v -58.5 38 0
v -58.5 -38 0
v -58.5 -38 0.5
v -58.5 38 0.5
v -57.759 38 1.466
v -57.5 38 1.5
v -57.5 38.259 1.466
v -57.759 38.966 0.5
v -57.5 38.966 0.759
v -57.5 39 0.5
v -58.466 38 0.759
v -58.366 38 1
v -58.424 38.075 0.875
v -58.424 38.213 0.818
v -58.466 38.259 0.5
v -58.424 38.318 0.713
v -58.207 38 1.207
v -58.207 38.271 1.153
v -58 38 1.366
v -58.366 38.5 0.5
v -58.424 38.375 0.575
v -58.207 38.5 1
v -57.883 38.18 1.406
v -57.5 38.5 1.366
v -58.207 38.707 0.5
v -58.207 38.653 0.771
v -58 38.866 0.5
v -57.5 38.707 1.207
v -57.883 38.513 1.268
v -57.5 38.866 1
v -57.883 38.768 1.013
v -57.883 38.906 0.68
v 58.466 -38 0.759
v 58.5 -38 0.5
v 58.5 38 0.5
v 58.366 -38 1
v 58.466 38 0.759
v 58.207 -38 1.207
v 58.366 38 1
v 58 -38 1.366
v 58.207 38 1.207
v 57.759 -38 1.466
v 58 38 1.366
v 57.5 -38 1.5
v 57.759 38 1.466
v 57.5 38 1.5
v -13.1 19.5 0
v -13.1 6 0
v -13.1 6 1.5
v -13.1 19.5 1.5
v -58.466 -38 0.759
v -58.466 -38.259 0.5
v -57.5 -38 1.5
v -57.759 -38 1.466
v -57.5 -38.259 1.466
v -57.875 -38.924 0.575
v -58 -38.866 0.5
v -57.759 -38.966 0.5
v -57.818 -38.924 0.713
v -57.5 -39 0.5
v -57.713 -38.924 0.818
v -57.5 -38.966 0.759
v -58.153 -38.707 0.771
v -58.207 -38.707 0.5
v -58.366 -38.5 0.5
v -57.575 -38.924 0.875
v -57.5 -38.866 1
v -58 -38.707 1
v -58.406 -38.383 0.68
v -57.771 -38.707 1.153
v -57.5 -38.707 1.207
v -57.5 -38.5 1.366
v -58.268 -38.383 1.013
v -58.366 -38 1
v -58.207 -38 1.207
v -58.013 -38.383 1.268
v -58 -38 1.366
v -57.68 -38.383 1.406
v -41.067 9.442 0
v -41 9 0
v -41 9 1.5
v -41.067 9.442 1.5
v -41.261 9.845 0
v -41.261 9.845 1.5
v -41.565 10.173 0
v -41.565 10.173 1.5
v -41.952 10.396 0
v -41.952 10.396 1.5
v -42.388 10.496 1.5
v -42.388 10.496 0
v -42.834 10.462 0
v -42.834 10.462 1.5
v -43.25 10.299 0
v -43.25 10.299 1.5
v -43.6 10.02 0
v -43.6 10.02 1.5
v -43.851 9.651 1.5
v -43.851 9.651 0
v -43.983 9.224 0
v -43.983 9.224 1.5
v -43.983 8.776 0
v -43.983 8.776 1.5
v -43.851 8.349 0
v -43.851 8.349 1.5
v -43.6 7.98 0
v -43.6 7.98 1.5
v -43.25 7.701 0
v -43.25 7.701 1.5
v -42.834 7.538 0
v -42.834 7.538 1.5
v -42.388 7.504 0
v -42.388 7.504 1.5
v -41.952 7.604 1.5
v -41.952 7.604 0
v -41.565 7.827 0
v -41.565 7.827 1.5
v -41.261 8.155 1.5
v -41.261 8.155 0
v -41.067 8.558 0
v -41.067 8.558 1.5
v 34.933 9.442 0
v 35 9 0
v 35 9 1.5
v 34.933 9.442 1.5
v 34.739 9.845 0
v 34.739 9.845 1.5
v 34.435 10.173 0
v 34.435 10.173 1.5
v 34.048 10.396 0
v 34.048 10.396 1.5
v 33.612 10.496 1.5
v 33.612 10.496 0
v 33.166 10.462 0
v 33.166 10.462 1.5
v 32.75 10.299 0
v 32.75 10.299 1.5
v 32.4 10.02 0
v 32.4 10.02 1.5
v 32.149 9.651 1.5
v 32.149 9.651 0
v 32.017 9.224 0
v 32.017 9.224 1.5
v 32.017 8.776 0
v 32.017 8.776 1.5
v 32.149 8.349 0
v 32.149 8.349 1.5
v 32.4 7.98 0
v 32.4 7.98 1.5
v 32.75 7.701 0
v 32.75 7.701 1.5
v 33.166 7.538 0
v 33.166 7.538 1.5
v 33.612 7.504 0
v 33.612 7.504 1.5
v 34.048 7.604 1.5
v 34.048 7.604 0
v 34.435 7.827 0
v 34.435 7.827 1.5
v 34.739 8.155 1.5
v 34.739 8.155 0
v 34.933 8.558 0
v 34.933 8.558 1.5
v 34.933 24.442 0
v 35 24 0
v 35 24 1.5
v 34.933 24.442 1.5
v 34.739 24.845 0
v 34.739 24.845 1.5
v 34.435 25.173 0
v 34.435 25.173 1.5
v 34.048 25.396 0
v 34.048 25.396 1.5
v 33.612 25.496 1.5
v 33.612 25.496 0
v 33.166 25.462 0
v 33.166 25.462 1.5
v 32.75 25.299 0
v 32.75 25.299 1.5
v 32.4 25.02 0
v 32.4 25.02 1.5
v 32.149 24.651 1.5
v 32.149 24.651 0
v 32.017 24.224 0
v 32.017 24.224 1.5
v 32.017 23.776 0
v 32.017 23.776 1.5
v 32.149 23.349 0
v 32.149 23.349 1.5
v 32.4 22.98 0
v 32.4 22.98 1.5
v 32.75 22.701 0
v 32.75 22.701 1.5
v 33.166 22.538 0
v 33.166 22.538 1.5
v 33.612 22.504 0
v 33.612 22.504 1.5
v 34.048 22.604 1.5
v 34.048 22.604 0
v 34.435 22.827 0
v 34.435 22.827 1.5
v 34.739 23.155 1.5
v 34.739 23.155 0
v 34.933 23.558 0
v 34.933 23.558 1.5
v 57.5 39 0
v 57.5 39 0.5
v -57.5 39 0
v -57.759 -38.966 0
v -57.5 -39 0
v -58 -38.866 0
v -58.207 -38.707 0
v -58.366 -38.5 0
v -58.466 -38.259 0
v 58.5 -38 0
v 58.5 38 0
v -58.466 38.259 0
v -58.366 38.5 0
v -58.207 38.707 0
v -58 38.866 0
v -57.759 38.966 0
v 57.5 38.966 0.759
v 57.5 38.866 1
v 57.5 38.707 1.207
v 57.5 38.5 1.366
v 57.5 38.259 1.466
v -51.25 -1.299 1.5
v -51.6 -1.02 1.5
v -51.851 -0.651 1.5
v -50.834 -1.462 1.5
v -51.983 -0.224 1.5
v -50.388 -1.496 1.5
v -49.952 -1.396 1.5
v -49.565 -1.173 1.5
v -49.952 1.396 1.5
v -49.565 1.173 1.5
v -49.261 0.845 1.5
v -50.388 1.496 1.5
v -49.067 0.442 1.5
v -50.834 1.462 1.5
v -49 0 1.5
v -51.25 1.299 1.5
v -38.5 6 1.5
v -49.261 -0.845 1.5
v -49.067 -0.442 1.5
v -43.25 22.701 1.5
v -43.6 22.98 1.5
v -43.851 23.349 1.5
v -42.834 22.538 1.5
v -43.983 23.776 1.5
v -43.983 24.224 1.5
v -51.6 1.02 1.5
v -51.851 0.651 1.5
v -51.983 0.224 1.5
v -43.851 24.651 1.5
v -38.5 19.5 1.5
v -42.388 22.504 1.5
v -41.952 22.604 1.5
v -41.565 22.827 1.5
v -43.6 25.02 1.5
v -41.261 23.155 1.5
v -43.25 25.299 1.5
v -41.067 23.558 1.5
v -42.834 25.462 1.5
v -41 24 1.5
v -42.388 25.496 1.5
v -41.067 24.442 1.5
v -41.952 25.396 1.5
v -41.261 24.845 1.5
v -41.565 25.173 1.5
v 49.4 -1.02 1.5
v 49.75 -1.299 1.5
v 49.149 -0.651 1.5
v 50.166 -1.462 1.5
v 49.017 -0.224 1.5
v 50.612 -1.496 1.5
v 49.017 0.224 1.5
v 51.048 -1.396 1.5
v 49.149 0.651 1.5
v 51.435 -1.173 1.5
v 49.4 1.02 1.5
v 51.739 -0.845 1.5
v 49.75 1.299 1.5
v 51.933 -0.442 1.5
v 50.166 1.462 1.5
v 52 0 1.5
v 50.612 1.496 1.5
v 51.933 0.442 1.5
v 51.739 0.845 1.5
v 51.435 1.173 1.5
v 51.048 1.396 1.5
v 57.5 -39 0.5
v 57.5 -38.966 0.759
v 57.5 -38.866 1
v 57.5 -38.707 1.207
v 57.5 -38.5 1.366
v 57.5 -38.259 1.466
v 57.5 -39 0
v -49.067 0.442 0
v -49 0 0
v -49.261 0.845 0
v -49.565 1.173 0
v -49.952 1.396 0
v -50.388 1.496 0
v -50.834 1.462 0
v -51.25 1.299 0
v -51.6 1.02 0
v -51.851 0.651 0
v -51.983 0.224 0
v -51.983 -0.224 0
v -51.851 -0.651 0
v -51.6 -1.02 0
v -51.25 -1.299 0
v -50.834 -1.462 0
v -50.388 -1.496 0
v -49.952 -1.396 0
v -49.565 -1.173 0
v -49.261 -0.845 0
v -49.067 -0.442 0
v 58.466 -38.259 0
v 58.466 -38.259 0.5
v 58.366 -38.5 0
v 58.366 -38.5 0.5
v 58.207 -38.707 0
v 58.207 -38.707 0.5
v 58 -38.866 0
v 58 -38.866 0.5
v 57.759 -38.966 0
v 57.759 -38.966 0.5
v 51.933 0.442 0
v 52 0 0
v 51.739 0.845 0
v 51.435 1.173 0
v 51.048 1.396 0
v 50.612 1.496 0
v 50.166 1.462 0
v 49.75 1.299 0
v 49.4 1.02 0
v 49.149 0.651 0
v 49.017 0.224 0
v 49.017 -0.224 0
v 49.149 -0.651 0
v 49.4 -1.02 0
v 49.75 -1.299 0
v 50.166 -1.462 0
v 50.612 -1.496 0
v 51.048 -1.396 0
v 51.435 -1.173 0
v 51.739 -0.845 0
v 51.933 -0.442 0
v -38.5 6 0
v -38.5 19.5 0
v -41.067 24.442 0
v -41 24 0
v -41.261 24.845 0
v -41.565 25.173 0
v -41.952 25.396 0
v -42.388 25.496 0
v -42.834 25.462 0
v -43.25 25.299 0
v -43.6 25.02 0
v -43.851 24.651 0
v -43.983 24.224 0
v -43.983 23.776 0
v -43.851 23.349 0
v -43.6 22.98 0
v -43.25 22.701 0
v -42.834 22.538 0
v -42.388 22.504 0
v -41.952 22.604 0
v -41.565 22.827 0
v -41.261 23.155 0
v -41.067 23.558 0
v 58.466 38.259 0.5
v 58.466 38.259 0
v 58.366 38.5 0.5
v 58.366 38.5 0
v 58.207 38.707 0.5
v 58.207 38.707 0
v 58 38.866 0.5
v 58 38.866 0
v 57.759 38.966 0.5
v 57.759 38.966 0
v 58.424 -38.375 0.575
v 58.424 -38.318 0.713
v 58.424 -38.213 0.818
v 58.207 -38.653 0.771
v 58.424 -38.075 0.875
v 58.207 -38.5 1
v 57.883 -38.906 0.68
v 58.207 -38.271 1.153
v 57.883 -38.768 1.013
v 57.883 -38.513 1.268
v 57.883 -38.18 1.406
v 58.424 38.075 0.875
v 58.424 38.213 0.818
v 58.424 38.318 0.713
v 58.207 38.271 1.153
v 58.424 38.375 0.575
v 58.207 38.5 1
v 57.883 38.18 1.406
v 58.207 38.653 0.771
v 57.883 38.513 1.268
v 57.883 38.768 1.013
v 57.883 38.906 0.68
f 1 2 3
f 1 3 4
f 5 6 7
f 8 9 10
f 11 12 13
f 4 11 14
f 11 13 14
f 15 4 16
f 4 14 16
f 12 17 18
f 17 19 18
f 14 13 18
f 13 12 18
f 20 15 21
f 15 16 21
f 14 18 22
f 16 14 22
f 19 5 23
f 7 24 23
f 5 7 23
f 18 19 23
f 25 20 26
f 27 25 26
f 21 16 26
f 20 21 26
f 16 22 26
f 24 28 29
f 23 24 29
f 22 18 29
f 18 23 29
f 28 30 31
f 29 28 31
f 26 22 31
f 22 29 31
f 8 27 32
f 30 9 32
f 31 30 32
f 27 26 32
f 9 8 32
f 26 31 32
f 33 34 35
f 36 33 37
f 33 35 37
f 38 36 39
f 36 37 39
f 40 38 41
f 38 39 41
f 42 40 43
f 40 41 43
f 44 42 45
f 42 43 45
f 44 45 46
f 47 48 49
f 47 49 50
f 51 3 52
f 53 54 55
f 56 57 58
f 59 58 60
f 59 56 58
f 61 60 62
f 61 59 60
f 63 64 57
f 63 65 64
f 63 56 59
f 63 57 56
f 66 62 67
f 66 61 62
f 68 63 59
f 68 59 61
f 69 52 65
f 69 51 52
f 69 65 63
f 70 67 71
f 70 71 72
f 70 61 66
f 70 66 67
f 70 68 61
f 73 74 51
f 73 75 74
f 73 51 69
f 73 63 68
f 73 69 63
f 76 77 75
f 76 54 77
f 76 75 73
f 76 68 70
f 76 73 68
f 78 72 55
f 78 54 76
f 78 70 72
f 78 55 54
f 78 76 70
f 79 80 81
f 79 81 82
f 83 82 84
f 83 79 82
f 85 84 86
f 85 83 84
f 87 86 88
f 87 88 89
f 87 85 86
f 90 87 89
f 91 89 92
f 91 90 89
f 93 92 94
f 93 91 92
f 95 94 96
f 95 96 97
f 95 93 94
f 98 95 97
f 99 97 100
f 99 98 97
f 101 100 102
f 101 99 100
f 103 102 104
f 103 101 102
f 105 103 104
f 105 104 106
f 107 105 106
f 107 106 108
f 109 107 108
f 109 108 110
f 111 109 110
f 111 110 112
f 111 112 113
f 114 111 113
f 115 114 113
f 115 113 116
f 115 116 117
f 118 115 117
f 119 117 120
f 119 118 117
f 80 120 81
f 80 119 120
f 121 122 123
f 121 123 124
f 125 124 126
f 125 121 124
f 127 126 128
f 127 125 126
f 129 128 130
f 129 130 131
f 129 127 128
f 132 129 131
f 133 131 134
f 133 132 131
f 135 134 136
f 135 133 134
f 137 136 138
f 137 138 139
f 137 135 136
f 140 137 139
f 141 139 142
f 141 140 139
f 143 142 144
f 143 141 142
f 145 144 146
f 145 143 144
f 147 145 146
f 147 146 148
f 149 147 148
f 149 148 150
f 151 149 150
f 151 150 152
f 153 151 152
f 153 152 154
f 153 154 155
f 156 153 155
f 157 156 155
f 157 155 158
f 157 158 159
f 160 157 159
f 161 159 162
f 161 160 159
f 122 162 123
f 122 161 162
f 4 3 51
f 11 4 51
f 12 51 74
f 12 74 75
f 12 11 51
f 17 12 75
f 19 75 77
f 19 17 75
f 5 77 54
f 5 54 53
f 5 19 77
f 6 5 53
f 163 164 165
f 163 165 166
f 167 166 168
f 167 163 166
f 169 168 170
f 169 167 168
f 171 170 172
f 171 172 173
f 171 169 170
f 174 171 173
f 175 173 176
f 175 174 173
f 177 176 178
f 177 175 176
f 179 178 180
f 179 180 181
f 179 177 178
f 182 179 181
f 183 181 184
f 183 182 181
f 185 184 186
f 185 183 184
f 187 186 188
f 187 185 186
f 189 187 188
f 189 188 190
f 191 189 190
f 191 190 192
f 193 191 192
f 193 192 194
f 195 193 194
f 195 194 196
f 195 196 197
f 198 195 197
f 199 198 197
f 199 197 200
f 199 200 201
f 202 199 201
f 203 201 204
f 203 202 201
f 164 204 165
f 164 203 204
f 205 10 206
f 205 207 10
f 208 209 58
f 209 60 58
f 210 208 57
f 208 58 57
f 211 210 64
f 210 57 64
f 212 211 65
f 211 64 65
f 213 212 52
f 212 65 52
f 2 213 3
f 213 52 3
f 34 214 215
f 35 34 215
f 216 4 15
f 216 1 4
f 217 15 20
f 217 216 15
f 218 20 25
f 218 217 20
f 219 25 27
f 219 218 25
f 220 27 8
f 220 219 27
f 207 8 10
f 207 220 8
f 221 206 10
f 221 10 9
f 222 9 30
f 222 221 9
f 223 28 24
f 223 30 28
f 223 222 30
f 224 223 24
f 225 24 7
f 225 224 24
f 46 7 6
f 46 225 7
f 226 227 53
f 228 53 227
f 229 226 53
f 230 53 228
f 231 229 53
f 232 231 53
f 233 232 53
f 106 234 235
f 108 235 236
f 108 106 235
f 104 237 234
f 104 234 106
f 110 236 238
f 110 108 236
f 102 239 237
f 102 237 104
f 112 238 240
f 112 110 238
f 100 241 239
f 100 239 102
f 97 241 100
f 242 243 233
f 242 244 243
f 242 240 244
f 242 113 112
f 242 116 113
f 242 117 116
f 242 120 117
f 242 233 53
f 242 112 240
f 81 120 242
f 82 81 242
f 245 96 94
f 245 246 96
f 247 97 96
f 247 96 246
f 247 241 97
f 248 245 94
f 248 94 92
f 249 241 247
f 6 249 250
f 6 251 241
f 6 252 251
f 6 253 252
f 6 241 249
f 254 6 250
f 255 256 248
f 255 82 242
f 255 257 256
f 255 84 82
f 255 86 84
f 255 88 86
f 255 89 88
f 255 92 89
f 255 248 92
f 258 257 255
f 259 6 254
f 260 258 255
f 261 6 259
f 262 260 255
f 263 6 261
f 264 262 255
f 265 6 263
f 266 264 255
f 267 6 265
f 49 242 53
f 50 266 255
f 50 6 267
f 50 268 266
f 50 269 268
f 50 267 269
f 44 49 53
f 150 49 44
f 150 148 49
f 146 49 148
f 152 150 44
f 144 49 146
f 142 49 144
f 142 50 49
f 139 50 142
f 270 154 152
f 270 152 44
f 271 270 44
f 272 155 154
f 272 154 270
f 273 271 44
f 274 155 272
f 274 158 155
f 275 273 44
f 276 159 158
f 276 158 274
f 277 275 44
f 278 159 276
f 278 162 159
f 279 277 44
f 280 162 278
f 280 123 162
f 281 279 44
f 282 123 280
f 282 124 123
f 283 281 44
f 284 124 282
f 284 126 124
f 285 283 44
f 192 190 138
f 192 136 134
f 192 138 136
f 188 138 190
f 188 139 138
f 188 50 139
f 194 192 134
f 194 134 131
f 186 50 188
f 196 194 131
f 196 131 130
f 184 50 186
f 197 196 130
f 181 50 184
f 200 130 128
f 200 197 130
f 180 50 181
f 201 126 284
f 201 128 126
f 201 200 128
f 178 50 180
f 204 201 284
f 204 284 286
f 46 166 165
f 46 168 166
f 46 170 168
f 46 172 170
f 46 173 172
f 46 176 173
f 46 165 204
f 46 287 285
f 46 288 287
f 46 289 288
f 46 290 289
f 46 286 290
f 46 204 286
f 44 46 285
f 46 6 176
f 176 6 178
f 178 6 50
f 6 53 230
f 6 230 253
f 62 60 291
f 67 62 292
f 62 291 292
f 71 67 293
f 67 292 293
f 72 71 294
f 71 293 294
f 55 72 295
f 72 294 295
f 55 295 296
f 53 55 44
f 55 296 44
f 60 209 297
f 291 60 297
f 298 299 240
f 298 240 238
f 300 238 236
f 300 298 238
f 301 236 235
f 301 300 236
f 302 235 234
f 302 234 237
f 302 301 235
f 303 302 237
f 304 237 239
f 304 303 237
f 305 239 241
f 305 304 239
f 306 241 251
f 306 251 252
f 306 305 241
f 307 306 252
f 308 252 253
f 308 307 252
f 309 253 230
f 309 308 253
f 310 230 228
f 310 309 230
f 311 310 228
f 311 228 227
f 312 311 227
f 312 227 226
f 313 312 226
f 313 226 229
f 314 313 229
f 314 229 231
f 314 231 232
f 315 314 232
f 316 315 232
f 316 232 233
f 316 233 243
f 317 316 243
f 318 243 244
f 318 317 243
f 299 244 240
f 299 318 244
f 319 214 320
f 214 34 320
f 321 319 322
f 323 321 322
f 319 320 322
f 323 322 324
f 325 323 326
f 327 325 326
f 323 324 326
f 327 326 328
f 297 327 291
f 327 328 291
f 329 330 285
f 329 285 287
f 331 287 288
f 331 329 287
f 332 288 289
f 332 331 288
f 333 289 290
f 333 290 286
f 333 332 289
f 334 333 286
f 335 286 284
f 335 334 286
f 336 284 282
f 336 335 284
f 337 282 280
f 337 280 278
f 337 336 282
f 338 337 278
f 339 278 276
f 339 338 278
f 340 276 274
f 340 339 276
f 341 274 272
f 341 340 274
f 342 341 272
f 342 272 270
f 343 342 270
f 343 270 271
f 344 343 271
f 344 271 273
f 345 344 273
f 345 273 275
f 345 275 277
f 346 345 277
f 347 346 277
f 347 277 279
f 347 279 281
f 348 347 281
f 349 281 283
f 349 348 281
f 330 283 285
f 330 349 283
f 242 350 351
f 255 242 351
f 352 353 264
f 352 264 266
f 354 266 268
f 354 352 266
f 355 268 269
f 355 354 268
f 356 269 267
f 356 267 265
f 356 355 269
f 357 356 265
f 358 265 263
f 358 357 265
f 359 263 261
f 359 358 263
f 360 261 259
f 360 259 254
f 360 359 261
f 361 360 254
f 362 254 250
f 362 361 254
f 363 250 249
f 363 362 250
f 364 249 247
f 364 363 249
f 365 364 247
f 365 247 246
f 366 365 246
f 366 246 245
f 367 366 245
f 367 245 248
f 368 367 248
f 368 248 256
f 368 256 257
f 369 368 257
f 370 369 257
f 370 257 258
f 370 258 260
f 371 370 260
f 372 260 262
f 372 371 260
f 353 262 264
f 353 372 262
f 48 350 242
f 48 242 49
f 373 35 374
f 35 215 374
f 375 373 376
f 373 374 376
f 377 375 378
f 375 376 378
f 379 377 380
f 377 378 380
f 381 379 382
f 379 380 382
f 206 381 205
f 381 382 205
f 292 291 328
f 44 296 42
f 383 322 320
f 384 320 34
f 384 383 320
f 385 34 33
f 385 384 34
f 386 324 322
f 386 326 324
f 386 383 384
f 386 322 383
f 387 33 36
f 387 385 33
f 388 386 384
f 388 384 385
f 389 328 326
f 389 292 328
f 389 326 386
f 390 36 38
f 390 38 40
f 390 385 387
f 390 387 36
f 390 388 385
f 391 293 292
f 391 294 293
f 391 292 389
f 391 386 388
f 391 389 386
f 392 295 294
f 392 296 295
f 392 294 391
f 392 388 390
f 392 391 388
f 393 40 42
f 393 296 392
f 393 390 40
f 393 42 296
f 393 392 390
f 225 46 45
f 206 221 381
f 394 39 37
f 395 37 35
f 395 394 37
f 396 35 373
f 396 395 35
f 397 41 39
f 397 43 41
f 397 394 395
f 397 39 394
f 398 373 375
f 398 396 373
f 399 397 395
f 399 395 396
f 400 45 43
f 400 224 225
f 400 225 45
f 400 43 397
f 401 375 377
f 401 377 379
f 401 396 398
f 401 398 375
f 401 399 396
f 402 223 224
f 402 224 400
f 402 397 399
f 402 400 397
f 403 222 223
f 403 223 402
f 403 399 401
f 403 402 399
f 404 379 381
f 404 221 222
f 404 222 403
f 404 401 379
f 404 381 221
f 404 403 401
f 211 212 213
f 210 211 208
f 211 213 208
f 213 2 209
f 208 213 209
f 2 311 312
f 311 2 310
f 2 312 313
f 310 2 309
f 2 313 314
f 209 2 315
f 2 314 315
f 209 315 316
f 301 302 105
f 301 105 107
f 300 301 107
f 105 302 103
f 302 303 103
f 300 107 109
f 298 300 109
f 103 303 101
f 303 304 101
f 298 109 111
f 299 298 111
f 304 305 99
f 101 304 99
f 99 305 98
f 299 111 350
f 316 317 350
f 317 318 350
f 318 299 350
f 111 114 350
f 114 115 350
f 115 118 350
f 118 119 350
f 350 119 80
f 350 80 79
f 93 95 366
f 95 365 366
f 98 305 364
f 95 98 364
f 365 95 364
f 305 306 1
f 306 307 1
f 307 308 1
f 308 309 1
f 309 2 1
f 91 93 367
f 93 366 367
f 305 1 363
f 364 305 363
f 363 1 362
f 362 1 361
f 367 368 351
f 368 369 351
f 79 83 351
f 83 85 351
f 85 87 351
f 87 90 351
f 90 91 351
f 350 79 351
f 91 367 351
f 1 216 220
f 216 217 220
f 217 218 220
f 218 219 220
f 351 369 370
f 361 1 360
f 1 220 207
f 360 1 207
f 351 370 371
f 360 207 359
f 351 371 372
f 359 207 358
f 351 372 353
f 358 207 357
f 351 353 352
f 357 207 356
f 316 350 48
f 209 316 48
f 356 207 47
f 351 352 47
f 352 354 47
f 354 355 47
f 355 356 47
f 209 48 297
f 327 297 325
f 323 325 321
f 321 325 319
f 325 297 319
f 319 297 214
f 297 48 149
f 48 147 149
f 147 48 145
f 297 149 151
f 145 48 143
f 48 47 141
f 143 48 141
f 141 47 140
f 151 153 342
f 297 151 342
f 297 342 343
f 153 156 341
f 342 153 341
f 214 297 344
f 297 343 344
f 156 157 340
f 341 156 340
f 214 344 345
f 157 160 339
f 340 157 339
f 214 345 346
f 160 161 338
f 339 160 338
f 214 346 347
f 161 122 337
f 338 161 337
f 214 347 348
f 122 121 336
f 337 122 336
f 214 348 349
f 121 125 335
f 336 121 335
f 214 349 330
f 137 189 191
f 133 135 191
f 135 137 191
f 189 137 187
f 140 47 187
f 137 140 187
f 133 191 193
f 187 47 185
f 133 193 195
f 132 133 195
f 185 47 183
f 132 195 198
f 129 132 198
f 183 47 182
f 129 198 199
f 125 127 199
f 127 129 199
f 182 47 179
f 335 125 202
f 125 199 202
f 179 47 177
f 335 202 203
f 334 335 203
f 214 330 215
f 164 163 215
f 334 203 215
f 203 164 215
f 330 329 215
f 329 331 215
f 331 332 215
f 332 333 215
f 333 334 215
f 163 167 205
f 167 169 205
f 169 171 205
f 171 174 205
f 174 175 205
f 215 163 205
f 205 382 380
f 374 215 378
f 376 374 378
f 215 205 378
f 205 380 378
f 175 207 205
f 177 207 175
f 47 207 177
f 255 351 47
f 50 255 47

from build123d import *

# Parameters (mm, degrees)
SKETCH_W    = 117
SKETCH_H    = 78
SKETCH_R    = 1.5
SKETCH_W_2  = 25.4
SKETCH_H_2  = 13.5
PAD_DEPTH   = 1.5
FILLET_R    = 1
FILLET001_R = 1
FILLET002_R = 1
FILLET003_R = 1


with BuildPart() as part:
    # Sketch → Pad (new body)
    with BuildSketch(Plane.XY):
        Rectangle(SKETCH_W, SKETCH_H)
        with Locations((-50.5, 0)):
            Circle(SKETCH_R, mode=Mode.SUBTRACT)
        with Locations((50.5, 0)):
            Circle(SKETCH_R, mode=Mode.SUBTRACT)
        with Locations((-42.5, 24)):
            Circle(SKETCH_R, mode=Mode.SUBTRACT)
        with Locations((-42.5, 9)):
            Circle(SKETCH_R, mode=Mode.SUBTRACT)
        with Locations((33.5, 24)):
            Circle(SKETCH_R, mode=Mode.SUBTRACT)
        with Locations((33.5, 9)):
            Circle(SKETCH_R, mode=Mode.SUBTRACT)
        with Locations((-25.8, 12.75)):
            Rectangle(SKETCH_W_2, SKETCH_H_2, mode=Mode.SUBTRACT)
    extrude(amount=PAD_DEPTH)

    # Fillet
    fillet_edges = [part.edges().sort_by_distance(p)[0] for p in [
        (0, 39, 1.5),
    ]]
    fillet(fillet_edges, radius=FILLET_R)

    # Fillet001
    fillet001_edges = [part.edges().sort_by_distance(p)[0] for p in [
        (-58.5, -0.5, 1.5),
    ]]
    fillet(fillet001_edges, radius=FILLET001_R)

    # Fillet002
    fillet002_edges = [part.edges().sort_by_distance(p)[0] for p in [
        (0.5, -39, 1.5),
    ]]
    fillet(fillet002_edges, radius=FILLET002_R)

    # Fillet003
    fillet003_edges = [part.edges().sort_by_distance(p)[0] for p in [
        (58.5, 0, 1.5),
    ]]
    fillet(fillet003_edges, radius=FILLET003_R)


solid = part.part
